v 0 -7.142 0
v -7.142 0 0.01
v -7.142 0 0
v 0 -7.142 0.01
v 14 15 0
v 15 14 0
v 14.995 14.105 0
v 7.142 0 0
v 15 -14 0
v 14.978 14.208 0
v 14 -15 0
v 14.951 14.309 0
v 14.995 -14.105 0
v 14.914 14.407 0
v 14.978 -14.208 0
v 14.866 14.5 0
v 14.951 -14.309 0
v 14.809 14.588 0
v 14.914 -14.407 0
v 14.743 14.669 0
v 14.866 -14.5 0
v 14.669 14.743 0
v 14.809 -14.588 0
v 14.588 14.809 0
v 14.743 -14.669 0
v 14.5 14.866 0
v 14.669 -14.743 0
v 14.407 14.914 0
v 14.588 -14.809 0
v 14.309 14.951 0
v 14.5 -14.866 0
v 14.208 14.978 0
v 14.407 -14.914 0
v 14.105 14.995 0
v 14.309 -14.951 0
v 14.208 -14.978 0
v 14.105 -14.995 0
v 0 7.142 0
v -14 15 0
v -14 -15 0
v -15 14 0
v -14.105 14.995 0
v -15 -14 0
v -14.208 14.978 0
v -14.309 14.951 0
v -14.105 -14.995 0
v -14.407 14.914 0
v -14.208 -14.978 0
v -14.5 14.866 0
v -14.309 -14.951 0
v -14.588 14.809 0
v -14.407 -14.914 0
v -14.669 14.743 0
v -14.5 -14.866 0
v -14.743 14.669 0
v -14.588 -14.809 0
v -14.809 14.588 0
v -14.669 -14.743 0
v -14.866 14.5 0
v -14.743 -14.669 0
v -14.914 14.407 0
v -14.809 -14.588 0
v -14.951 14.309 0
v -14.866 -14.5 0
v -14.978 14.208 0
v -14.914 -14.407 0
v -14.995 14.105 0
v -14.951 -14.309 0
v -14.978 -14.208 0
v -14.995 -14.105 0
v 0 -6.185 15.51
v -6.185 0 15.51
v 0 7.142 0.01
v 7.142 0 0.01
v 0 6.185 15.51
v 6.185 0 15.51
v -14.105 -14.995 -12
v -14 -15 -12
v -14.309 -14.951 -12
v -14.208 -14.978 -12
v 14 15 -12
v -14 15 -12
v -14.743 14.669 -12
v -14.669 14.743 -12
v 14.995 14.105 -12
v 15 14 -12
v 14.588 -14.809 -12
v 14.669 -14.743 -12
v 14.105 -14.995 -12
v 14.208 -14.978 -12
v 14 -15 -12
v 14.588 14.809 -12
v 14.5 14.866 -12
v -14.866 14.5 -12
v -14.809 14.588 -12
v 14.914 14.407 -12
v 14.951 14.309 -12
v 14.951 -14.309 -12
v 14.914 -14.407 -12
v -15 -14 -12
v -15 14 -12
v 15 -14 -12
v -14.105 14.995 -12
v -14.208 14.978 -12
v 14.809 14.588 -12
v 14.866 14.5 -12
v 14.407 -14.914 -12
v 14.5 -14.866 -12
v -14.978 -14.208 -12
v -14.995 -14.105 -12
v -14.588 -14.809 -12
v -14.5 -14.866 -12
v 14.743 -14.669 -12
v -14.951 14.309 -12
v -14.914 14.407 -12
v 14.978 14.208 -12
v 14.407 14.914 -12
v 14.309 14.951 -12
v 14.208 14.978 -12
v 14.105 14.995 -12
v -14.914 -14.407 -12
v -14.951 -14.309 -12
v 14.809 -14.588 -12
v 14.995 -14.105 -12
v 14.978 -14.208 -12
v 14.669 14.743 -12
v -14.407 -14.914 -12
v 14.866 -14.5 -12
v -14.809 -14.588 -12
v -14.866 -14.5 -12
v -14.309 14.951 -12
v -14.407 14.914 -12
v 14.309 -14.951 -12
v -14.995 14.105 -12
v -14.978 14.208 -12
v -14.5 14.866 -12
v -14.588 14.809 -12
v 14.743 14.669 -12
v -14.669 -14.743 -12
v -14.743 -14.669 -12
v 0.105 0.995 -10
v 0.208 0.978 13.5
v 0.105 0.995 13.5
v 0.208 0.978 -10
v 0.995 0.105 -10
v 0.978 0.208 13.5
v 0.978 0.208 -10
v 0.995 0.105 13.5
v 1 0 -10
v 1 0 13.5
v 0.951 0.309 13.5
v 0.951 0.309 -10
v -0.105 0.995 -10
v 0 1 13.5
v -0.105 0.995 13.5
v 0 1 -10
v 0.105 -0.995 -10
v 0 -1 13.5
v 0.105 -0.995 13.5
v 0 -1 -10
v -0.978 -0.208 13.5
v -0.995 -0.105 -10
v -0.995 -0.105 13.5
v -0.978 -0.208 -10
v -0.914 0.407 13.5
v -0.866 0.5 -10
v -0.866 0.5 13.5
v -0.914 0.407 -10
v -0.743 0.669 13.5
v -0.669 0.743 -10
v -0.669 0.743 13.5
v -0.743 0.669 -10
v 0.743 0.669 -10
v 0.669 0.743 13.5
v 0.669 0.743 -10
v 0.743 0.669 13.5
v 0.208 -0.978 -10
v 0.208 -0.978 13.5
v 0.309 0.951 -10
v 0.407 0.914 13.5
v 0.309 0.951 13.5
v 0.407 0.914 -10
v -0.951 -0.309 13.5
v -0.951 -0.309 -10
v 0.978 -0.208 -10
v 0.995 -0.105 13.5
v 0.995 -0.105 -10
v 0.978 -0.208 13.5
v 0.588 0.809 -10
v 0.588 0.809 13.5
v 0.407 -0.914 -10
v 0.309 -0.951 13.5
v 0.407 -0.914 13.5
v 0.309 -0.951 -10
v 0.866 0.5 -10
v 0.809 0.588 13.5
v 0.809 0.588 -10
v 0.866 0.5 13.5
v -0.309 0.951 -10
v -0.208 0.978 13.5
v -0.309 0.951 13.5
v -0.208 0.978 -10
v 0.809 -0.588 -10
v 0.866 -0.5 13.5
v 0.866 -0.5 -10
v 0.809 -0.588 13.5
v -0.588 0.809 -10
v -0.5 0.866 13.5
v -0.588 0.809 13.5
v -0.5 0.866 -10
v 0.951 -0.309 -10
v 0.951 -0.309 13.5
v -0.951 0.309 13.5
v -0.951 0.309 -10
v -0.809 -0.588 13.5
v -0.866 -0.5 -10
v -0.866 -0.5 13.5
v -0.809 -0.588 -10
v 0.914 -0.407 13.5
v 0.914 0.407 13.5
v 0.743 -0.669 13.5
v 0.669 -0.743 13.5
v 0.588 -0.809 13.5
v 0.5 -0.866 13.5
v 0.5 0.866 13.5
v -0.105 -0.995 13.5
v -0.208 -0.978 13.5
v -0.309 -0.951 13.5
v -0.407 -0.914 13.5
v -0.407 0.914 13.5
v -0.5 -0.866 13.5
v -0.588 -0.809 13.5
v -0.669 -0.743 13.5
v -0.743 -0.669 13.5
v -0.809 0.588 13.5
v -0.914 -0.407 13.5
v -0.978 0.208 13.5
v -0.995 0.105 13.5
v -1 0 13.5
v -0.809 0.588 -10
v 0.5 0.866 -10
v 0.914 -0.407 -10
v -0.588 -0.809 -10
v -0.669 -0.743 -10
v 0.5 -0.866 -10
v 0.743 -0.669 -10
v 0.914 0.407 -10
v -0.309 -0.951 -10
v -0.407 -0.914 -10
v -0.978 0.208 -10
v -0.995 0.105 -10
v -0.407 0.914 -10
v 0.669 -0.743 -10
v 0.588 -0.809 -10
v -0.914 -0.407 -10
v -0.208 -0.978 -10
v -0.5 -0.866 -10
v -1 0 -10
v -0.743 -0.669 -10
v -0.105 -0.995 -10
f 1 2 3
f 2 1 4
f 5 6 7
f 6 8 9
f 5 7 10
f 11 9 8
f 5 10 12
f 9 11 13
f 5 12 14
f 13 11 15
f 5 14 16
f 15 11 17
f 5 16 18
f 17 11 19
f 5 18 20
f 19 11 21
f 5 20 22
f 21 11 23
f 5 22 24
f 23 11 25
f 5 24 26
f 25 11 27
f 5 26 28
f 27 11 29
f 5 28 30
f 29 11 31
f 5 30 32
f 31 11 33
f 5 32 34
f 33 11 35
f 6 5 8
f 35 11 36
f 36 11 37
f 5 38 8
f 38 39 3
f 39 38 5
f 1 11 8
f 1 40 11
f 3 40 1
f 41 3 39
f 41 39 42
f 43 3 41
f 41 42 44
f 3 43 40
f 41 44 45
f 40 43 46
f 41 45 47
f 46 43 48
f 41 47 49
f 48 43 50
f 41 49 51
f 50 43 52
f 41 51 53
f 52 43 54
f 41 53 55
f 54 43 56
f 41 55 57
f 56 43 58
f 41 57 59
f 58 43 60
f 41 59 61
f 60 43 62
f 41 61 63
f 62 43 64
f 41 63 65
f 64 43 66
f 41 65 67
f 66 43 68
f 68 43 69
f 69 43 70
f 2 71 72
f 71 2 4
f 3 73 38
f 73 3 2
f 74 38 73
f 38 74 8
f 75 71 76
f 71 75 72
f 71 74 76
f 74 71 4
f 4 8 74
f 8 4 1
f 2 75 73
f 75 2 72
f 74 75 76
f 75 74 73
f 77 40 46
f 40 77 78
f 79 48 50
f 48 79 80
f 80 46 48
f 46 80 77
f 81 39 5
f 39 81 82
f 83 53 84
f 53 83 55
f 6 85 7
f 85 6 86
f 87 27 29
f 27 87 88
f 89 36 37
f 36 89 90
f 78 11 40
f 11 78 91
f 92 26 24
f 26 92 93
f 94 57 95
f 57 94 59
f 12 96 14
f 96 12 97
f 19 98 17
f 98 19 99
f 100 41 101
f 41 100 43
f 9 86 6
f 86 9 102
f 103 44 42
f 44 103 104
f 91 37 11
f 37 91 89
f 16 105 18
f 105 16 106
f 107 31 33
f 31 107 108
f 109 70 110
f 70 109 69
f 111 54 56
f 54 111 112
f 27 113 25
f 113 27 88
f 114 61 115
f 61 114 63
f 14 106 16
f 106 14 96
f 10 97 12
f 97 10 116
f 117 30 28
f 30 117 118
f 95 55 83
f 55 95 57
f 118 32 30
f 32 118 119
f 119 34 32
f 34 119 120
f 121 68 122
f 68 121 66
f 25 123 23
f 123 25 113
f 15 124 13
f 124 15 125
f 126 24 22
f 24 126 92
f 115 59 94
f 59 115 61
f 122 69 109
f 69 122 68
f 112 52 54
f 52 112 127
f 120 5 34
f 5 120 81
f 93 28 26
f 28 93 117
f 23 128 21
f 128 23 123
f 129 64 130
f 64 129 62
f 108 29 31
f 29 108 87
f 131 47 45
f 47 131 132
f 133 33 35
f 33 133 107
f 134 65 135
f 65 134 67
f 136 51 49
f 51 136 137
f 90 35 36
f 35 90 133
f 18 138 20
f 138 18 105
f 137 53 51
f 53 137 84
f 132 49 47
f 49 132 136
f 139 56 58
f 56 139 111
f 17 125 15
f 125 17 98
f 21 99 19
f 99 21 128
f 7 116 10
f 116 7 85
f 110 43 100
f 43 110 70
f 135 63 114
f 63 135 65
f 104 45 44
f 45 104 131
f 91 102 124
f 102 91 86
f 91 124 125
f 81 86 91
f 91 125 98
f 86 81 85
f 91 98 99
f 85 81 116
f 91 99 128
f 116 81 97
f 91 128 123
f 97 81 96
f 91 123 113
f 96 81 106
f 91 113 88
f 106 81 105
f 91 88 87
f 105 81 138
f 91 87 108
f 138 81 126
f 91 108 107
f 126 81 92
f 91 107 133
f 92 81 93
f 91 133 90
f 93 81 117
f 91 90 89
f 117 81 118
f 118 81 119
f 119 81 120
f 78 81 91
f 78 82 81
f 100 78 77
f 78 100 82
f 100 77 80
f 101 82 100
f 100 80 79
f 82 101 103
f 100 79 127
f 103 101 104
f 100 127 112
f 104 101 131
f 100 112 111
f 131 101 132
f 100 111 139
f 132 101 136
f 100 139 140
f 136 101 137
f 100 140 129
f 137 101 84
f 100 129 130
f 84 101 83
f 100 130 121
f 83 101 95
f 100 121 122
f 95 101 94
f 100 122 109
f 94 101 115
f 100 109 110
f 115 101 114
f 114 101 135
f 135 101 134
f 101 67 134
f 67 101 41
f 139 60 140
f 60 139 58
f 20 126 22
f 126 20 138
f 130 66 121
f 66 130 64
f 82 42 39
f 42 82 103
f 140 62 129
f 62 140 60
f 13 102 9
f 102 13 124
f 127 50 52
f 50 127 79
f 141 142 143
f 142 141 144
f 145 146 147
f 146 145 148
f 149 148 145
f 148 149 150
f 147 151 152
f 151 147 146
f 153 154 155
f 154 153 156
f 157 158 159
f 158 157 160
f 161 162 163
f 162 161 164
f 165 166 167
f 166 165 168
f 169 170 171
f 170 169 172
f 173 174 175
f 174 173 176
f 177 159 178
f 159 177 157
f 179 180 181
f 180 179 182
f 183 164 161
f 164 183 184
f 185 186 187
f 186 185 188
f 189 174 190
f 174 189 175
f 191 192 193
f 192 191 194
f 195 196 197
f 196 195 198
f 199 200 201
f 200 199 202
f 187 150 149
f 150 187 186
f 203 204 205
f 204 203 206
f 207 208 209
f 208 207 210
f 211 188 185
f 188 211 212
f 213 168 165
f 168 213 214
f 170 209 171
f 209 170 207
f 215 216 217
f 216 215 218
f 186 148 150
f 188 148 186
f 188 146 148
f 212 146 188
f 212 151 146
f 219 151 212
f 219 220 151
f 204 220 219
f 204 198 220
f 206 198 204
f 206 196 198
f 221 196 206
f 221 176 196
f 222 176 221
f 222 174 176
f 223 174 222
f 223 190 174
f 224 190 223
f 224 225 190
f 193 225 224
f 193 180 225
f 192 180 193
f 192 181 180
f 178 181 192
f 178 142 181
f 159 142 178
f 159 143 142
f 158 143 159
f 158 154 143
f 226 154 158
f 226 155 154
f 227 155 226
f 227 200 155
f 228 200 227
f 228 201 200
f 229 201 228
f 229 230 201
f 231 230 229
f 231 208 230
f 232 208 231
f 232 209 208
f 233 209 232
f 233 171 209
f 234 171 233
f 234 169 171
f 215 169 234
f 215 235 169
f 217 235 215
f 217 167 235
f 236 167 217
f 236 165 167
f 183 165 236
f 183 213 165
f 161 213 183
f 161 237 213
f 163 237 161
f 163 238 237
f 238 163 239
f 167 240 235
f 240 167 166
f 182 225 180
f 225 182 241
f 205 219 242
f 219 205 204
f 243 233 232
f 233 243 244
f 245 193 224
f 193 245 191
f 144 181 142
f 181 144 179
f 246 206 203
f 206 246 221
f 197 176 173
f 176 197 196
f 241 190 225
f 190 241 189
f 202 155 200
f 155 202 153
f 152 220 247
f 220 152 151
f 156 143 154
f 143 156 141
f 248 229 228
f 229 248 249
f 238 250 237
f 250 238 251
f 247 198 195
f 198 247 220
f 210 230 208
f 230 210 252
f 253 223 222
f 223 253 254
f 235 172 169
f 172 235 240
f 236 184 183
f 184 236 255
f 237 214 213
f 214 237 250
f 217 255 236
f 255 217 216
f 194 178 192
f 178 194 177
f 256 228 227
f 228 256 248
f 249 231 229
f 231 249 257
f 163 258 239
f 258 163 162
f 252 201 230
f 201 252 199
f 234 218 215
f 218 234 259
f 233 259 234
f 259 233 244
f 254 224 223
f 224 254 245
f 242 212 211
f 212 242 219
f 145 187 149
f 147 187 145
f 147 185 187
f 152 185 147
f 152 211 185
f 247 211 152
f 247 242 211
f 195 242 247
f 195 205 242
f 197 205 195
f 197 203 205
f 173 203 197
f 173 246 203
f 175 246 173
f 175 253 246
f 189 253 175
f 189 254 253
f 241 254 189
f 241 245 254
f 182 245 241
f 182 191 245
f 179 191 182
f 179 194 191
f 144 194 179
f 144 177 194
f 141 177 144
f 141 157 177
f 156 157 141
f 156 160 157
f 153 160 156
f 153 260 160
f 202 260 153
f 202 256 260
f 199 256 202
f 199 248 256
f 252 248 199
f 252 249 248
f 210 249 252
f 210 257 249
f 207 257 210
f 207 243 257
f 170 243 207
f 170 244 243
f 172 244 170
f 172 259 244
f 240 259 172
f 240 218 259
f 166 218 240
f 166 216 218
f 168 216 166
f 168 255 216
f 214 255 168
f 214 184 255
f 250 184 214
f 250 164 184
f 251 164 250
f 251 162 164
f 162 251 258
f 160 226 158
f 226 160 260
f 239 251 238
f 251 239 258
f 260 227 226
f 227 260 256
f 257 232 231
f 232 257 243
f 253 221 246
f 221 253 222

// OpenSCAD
// Arbor accessory for a circular

shape = "square"; // ["square", "round"]

SIZE = 30;
LENGTH = 12;

PISTON_SIZE = 25;
EJECTOR_LENGTH = 3;

PEG_HEIGHT = 15.5;
PEG_SIDE = 10 + 0.1;
PEG_DRAFT = 2.5;

PEG_SIDE_TOP = PEG_SIDE - 2 * PEG_HEIGHT * tan(PEG_DRAFT);
EJECTOR = SIZE < PISTON_SIZE + 3 - 3;

t = 0.01;
$fn = 60;

difference() {
    union() {
        AccPeg();
        if (EJECTOR) {
            EjectPlate();
        }
        translate([0,0, EJECTOR ? -EJECTOR_LENGTH : 0])
            if (shape == "round") {
                RoundPiston();
            } else {
                SqaurePiston();
            }
    }
    // Internal cylinder to provide strenght
    icl = (EJECTOR ? EJECTOR_LENGTH : 0) + LENGTH - 4;
    translate([0,0,-icl-2]) cylinder(d=2, h=PEG_HEIGHT + icl);
}

module AccPeg() {
    // ACCESSORY PEG - DO NOT CHANGE
    rotate([0,0,45])
    hull() {
        translate([-PEG_SIDE/2, -PEG_SIDE/2, 0]) cube([PEG_SIDE, PEG_SIDE, t]);
        translate([-PEG_SIDE_TOP/2, -PEG_SIDE_TOP/2, PEG_HEIGHT]) cube([PEG_SIDE_TOP, PEG_SIDE_TOP, t]);
    }
//    minkowski() {
//        i = 0.5;
//        i2 = i * 2;
//        hull() {
//            translate([-PEG_SIDE/2+i, -PEG_SIDE/2+i, 0]) cube([PEG_SIDE-i2, PEG_SIDE-i2, t]);
//            translate([-PEG_SIDE_TOP/2+i, -PEG_SIDE_TOP/2+i, PEG_HEIGHT]) cube([PEG_SIDE_TOP-i2, PEG_SIDE_TOP-i2, t]);
//        }
//        sphere(0.5);
//    }
}

module EjectPlate() {
    if (shape == "square") {
        x = PISTON_SIZE + 3;
        p = 3;
        translate([-x/2+0.5,-x/2+0.5,-p+0.5]) minkowski() {
           linear_extrude(p-1) offset(1) offset(-1) square([x-1, x-1]);
            sphere(0.5);
        }
    } else {
        rotate([180,0,0]) {
            translate([0,0,0.5]) minkowski(0.5) {
                linear_extrude(EJECTOR_LENGTH - 1) circle(d=PISTON_SIZE + 4 - 1);
                sphere(0.5);
            }
        }        
    }
}



module SqaurePiston() {
        rotate([0,180,0]) translate([-SIZE/2,-SIZE/2,0]) {
           linear_extrude(LENGTH) offset(1) offset(-1) square([SIZE, SIZE]);
            if (EJECTOR) {
                roundedCubeFillet(SIZE, SIZE, 1, 2);
            }
        }
    }
module RoundPiston() {
    rotate([180,0,0]) {
            linear_extrude(LENGTH) circle(d=SIZE);
            if (EJECTOR) {
                cylinderFillet(SIZE/2, min(3, PISTON_SIZE - SIZE + 1));
            }
        }
    }


//translate([50,0,0]) {
//    X = 8;
//    Y = 12;
//    roundedCube(X, Y, 30, 1);
//    roundedCubeFillet(X, Y, 1, 2);
//}

module cylinderFillet(r, f) {
    rotate_extrude(angle=360,convexity=2)
        translate([r+f,f,f])
            rotate([0,180,90])
                 difference() {
                    square([f,f]);
                    circle(r=f);
                }
}

//module cubeFillet(x, y, f) {
//        translate([-f, -f, 0]) {
//            cube([x + 2*f, y +2*f, f]);
//            roundedCubeFillet(x,y,f);
//        };
//}

module roundedCube(x, y, z, r) {
    hull() {
        translate([r,r,0]) cylinder(r=r, h=z);
        translate([x-r,r,0]) cylinder(r=r, h=z);
        translate([x-r,y-r,0]) cylinder(r=r, h=z);
        translate([r,y-r,0]) cylinder(r=r, h=z);
    }
}

module roundedCubeFillet(x, y, f, r) {
    module fillet2D() {
        translate([-r,-r]) difference() {
            square(r);
            circle(r=r);
        }
    }
    
    module longFillet(l) {
        rotate([-90,0,0]) linear_extrude(l) fillet2D();
    }
    
    module cornerFillet(rotateZ) {
        rotate([0,0,rotateZ])
            mirror([0,0,1])
                translate([-f,-f])
                    rotate_extrude(angle=90)
                        translate([-f,0]) fillet2D();
    }

    // Corners and y sides
    translate([x/2, y/2, 0]) for(m=[0:1]) mirror([m, 0]) {
        translate([x/2-r,y/2-r,0]) cornerFillet(180);
        translate([-x/2+r,-y/2+r,0]) cornerFillet(0);
        translate([-x/2,-y/2+f,0]) longFillet(y-2*f);   
    }
    // x sides
    translate([x-f,0,0]) rotate([0,0,90]) longFillet(x-2*f);
    translate([f,y,0]) rotate([0,0,-90]) longFillet(x-2*f);
}
